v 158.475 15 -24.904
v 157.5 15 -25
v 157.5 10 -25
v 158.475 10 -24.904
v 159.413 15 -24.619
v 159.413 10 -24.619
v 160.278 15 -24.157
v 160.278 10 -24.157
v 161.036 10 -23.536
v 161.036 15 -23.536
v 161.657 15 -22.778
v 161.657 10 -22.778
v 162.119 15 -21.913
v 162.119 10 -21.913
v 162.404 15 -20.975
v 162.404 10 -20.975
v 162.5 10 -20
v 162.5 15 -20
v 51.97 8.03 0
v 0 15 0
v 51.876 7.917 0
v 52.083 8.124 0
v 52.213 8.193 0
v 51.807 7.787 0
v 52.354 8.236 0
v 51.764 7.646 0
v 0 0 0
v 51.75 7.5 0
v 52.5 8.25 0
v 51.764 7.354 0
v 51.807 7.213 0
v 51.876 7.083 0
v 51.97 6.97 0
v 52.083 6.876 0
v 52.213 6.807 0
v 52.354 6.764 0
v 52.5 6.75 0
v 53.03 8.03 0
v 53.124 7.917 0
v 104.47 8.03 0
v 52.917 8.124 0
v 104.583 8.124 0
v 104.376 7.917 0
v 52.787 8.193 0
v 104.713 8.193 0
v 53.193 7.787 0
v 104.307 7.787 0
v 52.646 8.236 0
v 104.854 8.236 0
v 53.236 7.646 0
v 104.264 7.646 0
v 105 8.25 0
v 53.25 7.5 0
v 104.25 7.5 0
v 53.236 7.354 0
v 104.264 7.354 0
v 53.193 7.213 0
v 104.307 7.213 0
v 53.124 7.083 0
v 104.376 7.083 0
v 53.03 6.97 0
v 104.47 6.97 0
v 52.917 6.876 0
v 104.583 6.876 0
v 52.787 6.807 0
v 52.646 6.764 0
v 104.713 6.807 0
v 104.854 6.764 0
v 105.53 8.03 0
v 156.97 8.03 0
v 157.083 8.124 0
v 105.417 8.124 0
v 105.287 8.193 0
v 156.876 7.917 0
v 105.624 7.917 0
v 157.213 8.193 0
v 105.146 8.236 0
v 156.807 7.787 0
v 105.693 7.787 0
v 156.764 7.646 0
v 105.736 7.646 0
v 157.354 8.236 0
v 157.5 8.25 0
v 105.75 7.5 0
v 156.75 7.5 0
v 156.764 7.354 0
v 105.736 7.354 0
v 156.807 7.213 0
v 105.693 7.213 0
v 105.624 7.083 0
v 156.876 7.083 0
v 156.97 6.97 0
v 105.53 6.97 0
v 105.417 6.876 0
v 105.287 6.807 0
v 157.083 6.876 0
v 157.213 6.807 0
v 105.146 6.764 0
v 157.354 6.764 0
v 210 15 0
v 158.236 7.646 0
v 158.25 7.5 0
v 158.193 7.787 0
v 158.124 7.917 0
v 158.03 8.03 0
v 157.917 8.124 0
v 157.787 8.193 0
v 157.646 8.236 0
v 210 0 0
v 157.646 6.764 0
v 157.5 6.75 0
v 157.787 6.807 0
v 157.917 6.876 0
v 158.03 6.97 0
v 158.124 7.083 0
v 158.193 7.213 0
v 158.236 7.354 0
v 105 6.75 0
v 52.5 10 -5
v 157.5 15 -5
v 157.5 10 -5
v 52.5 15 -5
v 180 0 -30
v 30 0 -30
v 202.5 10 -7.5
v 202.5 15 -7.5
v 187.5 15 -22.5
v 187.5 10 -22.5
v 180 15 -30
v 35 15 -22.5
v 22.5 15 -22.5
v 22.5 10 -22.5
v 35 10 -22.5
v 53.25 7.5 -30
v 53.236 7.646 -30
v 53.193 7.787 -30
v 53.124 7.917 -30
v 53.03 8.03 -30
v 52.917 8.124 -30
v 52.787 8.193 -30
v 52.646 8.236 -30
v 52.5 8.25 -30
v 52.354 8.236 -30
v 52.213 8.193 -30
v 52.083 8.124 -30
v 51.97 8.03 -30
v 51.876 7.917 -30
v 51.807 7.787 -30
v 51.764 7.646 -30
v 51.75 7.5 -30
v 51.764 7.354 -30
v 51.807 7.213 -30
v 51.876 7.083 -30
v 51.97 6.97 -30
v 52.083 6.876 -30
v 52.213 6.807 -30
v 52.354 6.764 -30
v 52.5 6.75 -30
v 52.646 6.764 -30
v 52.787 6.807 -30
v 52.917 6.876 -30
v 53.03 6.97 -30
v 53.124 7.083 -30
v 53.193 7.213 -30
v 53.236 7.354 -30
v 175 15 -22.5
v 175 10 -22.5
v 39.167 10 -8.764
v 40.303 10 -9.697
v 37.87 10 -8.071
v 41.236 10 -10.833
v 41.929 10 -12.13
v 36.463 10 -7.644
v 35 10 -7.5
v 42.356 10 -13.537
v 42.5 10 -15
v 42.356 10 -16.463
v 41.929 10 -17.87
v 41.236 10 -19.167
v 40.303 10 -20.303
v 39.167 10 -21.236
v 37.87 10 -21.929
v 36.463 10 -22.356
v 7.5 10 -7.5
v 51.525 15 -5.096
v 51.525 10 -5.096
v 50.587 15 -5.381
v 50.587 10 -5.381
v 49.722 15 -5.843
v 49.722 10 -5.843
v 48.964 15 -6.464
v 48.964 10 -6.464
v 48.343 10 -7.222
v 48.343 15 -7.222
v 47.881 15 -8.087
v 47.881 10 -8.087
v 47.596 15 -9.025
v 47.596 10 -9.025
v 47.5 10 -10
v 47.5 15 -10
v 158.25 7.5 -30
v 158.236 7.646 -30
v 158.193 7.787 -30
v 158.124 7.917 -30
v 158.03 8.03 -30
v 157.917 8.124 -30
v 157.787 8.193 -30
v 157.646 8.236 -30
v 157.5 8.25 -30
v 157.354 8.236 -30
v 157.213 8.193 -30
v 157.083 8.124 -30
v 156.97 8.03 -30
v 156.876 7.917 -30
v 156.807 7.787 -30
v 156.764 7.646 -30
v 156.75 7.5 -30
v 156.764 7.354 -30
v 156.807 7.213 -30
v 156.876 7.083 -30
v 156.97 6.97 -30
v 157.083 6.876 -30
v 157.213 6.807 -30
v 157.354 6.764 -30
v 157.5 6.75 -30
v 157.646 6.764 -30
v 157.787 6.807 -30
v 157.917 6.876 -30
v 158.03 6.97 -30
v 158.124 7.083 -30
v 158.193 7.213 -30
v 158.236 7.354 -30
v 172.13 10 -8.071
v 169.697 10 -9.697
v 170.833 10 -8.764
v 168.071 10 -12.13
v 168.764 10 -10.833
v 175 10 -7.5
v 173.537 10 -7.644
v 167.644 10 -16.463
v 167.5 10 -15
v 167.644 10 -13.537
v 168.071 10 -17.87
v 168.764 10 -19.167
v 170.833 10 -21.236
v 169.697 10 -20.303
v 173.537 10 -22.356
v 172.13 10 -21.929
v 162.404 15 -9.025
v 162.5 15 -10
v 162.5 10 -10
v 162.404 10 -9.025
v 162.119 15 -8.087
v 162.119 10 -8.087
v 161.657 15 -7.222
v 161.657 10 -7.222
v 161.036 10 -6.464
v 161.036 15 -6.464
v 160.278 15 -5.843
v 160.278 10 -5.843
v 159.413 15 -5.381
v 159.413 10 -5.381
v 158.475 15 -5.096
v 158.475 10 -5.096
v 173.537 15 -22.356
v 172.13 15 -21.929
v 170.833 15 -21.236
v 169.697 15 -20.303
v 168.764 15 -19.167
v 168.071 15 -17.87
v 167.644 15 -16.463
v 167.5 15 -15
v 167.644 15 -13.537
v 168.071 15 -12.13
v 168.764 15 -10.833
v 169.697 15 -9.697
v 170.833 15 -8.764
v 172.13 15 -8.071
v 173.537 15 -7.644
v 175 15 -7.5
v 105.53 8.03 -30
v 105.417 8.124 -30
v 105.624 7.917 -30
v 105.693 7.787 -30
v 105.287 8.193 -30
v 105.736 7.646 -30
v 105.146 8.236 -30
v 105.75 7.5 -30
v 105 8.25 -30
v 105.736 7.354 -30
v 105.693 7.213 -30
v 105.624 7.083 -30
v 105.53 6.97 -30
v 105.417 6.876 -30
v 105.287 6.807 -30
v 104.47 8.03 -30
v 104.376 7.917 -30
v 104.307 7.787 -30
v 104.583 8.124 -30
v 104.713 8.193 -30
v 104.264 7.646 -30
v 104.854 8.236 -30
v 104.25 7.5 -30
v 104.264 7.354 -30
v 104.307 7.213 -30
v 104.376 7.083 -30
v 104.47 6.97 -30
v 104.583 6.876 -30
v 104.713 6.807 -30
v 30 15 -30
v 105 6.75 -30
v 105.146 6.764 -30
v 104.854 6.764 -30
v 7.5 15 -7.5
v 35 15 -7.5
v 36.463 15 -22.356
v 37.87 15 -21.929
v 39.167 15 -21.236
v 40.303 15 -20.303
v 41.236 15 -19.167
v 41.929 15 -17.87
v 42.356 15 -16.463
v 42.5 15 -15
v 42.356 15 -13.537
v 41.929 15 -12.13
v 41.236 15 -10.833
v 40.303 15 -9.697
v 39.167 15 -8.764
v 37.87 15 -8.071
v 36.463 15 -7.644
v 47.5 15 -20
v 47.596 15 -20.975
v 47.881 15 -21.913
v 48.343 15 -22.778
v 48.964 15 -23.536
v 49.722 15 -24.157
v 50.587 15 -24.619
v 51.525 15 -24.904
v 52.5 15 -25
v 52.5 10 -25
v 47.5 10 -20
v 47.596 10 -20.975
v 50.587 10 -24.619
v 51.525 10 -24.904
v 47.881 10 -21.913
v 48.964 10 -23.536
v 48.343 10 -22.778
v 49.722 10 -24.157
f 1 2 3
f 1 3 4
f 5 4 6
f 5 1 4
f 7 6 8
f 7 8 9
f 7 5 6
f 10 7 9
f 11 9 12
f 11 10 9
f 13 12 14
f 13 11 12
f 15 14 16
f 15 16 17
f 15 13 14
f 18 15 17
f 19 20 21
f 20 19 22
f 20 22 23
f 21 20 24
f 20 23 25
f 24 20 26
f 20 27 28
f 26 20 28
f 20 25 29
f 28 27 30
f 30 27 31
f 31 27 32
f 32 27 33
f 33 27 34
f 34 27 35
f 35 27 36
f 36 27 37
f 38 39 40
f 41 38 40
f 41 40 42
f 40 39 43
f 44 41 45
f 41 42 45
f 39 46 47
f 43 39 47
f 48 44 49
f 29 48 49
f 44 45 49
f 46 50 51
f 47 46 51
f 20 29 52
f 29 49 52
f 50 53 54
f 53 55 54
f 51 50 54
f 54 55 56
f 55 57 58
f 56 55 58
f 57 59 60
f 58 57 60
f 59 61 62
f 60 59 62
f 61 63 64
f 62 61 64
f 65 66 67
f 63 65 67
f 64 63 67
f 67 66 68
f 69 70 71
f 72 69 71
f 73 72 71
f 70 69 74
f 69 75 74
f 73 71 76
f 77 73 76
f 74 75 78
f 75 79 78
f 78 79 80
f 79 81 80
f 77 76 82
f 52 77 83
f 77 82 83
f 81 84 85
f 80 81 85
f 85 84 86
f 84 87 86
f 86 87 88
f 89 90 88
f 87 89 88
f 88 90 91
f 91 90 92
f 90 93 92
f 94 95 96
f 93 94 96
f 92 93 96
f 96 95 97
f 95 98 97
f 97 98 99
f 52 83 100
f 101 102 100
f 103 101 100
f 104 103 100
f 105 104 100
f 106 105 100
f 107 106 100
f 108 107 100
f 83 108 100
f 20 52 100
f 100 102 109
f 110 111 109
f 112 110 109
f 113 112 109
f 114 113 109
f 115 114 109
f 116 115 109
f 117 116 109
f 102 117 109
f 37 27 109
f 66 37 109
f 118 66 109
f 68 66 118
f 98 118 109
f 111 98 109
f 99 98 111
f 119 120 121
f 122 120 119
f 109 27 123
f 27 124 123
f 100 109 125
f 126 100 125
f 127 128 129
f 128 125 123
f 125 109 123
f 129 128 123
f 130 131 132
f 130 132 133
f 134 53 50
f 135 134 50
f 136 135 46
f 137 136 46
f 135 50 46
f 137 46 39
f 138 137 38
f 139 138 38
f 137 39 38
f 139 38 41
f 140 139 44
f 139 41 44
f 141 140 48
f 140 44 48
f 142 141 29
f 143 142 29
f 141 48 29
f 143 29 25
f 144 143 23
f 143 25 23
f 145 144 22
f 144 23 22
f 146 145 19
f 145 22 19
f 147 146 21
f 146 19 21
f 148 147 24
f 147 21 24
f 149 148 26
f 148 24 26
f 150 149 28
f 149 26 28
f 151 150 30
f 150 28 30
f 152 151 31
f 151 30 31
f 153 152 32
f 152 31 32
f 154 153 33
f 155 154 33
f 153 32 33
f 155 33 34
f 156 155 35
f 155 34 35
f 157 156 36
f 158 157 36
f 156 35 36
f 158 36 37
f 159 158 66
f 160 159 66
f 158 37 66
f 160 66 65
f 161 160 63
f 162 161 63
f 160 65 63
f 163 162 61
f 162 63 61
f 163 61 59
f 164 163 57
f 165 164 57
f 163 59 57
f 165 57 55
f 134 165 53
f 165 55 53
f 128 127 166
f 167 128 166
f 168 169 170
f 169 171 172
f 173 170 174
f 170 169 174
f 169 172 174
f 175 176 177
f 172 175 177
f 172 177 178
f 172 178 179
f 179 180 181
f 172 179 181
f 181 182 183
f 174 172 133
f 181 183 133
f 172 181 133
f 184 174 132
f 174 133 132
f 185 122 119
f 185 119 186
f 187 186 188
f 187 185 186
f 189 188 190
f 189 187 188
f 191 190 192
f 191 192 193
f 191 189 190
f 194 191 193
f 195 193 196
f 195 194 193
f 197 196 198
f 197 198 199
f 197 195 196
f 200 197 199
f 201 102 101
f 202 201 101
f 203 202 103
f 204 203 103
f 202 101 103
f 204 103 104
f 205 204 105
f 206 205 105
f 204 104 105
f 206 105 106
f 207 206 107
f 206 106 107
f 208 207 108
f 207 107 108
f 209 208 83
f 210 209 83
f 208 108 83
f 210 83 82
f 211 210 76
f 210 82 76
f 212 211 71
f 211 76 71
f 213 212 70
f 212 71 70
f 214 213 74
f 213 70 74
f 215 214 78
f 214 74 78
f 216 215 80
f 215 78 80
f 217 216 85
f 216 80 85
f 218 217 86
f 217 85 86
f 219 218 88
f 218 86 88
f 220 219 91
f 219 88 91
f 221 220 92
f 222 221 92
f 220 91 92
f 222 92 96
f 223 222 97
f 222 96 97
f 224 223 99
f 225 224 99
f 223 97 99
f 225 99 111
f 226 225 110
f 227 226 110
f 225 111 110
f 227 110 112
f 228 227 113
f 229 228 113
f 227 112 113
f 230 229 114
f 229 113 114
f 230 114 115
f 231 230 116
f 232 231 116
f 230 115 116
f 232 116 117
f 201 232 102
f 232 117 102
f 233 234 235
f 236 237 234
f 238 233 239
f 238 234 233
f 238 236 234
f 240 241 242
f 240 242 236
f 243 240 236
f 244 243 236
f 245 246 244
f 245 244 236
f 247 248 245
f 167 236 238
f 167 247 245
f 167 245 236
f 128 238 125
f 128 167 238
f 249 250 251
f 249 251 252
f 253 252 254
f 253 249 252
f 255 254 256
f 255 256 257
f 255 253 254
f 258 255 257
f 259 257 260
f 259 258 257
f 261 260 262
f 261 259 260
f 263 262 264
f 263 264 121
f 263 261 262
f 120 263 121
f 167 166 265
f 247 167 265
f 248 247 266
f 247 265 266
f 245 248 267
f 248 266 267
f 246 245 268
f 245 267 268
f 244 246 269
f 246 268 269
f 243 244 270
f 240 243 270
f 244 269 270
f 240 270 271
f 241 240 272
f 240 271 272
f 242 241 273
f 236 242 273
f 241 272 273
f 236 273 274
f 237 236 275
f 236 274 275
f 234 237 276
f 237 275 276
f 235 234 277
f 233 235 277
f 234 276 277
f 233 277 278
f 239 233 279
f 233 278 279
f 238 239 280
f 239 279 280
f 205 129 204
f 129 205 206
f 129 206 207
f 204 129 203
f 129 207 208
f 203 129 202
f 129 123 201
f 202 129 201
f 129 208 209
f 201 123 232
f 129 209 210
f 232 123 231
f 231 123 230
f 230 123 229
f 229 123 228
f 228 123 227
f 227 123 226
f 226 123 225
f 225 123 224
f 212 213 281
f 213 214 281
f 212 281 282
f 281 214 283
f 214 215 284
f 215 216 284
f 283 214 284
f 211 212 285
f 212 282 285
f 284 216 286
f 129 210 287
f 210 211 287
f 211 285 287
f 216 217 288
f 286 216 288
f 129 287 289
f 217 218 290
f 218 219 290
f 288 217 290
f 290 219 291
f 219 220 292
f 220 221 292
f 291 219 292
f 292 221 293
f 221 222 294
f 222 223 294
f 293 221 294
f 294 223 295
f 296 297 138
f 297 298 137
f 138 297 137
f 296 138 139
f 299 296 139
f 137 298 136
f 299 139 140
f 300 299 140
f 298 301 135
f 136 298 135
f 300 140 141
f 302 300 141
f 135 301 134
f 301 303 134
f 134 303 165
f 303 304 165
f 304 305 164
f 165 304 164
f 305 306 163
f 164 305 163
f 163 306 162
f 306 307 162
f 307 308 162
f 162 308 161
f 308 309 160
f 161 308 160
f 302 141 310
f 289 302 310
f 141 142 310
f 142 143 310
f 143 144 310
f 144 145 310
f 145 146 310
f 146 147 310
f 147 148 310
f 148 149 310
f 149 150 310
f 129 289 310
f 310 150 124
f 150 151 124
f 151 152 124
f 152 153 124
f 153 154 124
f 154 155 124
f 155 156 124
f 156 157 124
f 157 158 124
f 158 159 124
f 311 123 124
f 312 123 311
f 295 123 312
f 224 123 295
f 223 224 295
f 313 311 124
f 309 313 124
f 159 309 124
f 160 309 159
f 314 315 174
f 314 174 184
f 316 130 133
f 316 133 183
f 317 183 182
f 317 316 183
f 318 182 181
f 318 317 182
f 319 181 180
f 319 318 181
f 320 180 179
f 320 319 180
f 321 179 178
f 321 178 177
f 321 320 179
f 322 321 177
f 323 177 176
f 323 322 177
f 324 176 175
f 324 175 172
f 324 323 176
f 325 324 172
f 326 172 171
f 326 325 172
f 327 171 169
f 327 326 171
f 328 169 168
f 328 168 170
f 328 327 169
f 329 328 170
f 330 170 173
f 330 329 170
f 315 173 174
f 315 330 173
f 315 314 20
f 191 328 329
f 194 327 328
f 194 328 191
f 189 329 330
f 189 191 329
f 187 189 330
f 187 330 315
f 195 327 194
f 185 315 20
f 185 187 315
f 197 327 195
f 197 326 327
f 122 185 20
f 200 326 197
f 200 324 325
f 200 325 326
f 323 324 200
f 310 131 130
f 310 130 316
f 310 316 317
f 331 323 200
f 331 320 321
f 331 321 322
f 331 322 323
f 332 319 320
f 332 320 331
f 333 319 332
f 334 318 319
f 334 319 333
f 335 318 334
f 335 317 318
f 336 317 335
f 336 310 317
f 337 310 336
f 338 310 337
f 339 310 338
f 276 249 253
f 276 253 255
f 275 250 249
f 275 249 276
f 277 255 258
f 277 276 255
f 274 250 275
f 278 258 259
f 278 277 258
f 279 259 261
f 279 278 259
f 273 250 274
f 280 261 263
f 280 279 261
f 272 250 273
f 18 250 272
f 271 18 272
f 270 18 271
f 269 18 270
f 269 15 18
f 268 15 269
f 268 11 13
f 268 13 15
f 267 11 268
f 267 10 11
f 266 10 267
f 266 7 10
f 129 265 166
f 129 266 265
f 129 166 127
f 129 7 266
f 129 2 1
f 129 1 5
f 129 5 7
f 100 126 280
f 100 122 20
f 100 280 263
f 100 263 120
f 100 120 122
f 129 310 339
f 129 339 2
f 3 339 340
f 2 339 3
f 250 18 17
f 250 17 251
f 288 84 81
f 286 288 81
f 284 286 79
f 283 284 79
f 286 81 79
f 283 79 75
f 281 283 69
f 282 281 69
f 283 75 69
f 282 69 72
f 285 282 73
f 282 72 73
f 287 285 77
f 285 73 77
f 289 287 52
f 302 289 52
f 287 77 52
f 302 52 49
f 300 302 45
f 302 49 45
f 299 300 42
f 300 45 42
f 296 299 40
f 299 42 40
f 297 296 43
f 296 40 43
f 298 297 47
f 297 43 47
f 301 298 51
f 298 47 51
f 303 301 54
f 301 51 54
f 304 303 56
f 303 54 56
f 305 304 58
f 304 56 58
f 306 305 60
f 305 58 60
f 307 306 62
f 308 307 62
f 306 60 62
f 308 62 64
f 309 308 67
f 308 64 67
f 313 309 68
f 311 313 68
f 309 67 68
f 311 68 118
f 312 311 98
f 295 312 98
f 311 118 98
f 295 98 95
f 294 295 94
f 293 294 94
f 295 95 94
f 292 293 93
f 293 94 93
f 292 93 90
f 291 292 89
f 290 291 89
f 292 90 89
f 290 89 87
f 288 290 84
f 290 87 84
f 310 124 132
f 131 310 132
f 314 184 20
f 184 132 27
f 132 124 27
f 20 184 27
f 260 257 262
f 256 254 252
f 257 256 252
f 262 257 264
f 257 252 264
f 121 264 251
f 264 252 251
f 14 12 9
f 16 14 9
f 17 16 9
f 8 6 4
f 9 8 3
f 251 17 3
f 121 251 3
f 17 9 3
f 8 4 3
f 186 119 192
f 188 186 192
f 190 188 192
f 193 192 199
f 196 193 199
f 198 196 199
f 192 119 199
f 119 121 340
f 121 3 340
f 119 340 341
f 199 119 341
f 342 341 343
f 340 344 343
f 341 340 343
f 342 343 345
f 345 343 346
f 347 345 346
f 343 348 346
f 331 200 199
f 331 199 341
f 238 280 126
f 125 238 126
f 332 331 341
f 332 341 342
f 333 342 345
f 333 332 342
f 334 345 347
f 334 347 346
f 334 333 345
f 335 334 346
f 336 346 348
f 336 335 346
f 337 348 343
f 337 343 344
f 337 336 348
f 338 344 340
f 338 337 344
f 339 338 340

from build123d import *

# Parameters (mm, degrees)
BOSS_EXTRUDE1_DEPTH = 15
CUT_EXTRUDE1_DEPTH  = 5
SKETCH3_R           = 0.75
CUT_EXTRUDE2_DEPTH  = 30
CUT_EXTRUDE3_DEPTH  = 5


with BuildPart() as part:
    # Sketch1 → Boss-Extrude1 (new body)
    with BuildSketch(Plane(origin=(0, 0, 0), x_dir=(1, 0, 0), z_dir=(0, 1, 0))):
        Polygon((0, 0), (210, 0), (180, 30), (30, 30), align=None)
    extrude(amount=BOSS_EXTRUDE1_DEPTH)

    # Sketch2 → Cut-Extrude1 (cut)
    with BuildSketch(Plane(origin=(0, 15, 0), x_dir=(1, 0, 0), z_dir=(0, 1, 0))):
        with BuildLine():
            Line((-5, 22.5), (35, 22.5))
            ThreePointArc((35, 22.5), (42.5, 15), (35, 7.5))
            Line((35, 7.5), (-5, 7.5))
            ThreePointArc((-5, 7.5), (-12.5, 15), (-5, 22.5))
        make_face()
        with BuildLine():
            Line((215, 22.5), (175, 22.5))
            ThreePointArc((175, 22.5), (167.5, 15), (175, 7.5))
            Line((175, 7.5), (215, 7.5))
            ThreePointArc((215, 7.5), (222.5, 15), (215, 22.5))
        make_face()
    extrude(amount=-CUT_EXTRUDE1_DEPTH, mode=Mode.SUBTRACT)

    # Sketch3 → Cut-Extrude2 (cut)
    with BuildSketch(Plane.XY):
        with Locations((105, 7.5)):
            Circle(SKETCH3_R)
        with Locations((52.5, 7.5)):
            Circle(SKETCH3_R)
        with Locations((157.5, 7.5)):
            Circle(SKETCH3_R)
    extrude(amount=-CUT_EXTRUDE2_DEPTH, mode=Mode.SUBTRACT)

    # Sketch4 → Cut-Extrude3 (cut)
    with BuildSketch(Plane(origin=(0, 15, 0), x_dir=(1, 0, 0), z_dir=(0, 1, 0))):
        with BuildLine():
            Line((52.5, 25), (157.5, 25))
            ThreePointArc((157.5, 25), (161.035533906, 23.535533906), (162.5, 20))
            Line((162.5, 20), (162.5, 10))
            ThreePointArc((162.5, 10), (161.035533906, 6.464466094), (157.5, 5))
            Line((157.5, 5), (52.5, 5))
            ThreePointArc((52.5, 5), (48.964466094, 6.464466094), (47.5, 10))
            Line((47.5, 10), (47.5, 20))
            ThreePointArc((47.5, 20), (48.964466094, 23.535533906), (52.5, 25))
        make_face()
    extrude(amount=-CUT_EXTRUDE3_DEPTH, mode=Mode.SUBTRACT)


solid = part.part
